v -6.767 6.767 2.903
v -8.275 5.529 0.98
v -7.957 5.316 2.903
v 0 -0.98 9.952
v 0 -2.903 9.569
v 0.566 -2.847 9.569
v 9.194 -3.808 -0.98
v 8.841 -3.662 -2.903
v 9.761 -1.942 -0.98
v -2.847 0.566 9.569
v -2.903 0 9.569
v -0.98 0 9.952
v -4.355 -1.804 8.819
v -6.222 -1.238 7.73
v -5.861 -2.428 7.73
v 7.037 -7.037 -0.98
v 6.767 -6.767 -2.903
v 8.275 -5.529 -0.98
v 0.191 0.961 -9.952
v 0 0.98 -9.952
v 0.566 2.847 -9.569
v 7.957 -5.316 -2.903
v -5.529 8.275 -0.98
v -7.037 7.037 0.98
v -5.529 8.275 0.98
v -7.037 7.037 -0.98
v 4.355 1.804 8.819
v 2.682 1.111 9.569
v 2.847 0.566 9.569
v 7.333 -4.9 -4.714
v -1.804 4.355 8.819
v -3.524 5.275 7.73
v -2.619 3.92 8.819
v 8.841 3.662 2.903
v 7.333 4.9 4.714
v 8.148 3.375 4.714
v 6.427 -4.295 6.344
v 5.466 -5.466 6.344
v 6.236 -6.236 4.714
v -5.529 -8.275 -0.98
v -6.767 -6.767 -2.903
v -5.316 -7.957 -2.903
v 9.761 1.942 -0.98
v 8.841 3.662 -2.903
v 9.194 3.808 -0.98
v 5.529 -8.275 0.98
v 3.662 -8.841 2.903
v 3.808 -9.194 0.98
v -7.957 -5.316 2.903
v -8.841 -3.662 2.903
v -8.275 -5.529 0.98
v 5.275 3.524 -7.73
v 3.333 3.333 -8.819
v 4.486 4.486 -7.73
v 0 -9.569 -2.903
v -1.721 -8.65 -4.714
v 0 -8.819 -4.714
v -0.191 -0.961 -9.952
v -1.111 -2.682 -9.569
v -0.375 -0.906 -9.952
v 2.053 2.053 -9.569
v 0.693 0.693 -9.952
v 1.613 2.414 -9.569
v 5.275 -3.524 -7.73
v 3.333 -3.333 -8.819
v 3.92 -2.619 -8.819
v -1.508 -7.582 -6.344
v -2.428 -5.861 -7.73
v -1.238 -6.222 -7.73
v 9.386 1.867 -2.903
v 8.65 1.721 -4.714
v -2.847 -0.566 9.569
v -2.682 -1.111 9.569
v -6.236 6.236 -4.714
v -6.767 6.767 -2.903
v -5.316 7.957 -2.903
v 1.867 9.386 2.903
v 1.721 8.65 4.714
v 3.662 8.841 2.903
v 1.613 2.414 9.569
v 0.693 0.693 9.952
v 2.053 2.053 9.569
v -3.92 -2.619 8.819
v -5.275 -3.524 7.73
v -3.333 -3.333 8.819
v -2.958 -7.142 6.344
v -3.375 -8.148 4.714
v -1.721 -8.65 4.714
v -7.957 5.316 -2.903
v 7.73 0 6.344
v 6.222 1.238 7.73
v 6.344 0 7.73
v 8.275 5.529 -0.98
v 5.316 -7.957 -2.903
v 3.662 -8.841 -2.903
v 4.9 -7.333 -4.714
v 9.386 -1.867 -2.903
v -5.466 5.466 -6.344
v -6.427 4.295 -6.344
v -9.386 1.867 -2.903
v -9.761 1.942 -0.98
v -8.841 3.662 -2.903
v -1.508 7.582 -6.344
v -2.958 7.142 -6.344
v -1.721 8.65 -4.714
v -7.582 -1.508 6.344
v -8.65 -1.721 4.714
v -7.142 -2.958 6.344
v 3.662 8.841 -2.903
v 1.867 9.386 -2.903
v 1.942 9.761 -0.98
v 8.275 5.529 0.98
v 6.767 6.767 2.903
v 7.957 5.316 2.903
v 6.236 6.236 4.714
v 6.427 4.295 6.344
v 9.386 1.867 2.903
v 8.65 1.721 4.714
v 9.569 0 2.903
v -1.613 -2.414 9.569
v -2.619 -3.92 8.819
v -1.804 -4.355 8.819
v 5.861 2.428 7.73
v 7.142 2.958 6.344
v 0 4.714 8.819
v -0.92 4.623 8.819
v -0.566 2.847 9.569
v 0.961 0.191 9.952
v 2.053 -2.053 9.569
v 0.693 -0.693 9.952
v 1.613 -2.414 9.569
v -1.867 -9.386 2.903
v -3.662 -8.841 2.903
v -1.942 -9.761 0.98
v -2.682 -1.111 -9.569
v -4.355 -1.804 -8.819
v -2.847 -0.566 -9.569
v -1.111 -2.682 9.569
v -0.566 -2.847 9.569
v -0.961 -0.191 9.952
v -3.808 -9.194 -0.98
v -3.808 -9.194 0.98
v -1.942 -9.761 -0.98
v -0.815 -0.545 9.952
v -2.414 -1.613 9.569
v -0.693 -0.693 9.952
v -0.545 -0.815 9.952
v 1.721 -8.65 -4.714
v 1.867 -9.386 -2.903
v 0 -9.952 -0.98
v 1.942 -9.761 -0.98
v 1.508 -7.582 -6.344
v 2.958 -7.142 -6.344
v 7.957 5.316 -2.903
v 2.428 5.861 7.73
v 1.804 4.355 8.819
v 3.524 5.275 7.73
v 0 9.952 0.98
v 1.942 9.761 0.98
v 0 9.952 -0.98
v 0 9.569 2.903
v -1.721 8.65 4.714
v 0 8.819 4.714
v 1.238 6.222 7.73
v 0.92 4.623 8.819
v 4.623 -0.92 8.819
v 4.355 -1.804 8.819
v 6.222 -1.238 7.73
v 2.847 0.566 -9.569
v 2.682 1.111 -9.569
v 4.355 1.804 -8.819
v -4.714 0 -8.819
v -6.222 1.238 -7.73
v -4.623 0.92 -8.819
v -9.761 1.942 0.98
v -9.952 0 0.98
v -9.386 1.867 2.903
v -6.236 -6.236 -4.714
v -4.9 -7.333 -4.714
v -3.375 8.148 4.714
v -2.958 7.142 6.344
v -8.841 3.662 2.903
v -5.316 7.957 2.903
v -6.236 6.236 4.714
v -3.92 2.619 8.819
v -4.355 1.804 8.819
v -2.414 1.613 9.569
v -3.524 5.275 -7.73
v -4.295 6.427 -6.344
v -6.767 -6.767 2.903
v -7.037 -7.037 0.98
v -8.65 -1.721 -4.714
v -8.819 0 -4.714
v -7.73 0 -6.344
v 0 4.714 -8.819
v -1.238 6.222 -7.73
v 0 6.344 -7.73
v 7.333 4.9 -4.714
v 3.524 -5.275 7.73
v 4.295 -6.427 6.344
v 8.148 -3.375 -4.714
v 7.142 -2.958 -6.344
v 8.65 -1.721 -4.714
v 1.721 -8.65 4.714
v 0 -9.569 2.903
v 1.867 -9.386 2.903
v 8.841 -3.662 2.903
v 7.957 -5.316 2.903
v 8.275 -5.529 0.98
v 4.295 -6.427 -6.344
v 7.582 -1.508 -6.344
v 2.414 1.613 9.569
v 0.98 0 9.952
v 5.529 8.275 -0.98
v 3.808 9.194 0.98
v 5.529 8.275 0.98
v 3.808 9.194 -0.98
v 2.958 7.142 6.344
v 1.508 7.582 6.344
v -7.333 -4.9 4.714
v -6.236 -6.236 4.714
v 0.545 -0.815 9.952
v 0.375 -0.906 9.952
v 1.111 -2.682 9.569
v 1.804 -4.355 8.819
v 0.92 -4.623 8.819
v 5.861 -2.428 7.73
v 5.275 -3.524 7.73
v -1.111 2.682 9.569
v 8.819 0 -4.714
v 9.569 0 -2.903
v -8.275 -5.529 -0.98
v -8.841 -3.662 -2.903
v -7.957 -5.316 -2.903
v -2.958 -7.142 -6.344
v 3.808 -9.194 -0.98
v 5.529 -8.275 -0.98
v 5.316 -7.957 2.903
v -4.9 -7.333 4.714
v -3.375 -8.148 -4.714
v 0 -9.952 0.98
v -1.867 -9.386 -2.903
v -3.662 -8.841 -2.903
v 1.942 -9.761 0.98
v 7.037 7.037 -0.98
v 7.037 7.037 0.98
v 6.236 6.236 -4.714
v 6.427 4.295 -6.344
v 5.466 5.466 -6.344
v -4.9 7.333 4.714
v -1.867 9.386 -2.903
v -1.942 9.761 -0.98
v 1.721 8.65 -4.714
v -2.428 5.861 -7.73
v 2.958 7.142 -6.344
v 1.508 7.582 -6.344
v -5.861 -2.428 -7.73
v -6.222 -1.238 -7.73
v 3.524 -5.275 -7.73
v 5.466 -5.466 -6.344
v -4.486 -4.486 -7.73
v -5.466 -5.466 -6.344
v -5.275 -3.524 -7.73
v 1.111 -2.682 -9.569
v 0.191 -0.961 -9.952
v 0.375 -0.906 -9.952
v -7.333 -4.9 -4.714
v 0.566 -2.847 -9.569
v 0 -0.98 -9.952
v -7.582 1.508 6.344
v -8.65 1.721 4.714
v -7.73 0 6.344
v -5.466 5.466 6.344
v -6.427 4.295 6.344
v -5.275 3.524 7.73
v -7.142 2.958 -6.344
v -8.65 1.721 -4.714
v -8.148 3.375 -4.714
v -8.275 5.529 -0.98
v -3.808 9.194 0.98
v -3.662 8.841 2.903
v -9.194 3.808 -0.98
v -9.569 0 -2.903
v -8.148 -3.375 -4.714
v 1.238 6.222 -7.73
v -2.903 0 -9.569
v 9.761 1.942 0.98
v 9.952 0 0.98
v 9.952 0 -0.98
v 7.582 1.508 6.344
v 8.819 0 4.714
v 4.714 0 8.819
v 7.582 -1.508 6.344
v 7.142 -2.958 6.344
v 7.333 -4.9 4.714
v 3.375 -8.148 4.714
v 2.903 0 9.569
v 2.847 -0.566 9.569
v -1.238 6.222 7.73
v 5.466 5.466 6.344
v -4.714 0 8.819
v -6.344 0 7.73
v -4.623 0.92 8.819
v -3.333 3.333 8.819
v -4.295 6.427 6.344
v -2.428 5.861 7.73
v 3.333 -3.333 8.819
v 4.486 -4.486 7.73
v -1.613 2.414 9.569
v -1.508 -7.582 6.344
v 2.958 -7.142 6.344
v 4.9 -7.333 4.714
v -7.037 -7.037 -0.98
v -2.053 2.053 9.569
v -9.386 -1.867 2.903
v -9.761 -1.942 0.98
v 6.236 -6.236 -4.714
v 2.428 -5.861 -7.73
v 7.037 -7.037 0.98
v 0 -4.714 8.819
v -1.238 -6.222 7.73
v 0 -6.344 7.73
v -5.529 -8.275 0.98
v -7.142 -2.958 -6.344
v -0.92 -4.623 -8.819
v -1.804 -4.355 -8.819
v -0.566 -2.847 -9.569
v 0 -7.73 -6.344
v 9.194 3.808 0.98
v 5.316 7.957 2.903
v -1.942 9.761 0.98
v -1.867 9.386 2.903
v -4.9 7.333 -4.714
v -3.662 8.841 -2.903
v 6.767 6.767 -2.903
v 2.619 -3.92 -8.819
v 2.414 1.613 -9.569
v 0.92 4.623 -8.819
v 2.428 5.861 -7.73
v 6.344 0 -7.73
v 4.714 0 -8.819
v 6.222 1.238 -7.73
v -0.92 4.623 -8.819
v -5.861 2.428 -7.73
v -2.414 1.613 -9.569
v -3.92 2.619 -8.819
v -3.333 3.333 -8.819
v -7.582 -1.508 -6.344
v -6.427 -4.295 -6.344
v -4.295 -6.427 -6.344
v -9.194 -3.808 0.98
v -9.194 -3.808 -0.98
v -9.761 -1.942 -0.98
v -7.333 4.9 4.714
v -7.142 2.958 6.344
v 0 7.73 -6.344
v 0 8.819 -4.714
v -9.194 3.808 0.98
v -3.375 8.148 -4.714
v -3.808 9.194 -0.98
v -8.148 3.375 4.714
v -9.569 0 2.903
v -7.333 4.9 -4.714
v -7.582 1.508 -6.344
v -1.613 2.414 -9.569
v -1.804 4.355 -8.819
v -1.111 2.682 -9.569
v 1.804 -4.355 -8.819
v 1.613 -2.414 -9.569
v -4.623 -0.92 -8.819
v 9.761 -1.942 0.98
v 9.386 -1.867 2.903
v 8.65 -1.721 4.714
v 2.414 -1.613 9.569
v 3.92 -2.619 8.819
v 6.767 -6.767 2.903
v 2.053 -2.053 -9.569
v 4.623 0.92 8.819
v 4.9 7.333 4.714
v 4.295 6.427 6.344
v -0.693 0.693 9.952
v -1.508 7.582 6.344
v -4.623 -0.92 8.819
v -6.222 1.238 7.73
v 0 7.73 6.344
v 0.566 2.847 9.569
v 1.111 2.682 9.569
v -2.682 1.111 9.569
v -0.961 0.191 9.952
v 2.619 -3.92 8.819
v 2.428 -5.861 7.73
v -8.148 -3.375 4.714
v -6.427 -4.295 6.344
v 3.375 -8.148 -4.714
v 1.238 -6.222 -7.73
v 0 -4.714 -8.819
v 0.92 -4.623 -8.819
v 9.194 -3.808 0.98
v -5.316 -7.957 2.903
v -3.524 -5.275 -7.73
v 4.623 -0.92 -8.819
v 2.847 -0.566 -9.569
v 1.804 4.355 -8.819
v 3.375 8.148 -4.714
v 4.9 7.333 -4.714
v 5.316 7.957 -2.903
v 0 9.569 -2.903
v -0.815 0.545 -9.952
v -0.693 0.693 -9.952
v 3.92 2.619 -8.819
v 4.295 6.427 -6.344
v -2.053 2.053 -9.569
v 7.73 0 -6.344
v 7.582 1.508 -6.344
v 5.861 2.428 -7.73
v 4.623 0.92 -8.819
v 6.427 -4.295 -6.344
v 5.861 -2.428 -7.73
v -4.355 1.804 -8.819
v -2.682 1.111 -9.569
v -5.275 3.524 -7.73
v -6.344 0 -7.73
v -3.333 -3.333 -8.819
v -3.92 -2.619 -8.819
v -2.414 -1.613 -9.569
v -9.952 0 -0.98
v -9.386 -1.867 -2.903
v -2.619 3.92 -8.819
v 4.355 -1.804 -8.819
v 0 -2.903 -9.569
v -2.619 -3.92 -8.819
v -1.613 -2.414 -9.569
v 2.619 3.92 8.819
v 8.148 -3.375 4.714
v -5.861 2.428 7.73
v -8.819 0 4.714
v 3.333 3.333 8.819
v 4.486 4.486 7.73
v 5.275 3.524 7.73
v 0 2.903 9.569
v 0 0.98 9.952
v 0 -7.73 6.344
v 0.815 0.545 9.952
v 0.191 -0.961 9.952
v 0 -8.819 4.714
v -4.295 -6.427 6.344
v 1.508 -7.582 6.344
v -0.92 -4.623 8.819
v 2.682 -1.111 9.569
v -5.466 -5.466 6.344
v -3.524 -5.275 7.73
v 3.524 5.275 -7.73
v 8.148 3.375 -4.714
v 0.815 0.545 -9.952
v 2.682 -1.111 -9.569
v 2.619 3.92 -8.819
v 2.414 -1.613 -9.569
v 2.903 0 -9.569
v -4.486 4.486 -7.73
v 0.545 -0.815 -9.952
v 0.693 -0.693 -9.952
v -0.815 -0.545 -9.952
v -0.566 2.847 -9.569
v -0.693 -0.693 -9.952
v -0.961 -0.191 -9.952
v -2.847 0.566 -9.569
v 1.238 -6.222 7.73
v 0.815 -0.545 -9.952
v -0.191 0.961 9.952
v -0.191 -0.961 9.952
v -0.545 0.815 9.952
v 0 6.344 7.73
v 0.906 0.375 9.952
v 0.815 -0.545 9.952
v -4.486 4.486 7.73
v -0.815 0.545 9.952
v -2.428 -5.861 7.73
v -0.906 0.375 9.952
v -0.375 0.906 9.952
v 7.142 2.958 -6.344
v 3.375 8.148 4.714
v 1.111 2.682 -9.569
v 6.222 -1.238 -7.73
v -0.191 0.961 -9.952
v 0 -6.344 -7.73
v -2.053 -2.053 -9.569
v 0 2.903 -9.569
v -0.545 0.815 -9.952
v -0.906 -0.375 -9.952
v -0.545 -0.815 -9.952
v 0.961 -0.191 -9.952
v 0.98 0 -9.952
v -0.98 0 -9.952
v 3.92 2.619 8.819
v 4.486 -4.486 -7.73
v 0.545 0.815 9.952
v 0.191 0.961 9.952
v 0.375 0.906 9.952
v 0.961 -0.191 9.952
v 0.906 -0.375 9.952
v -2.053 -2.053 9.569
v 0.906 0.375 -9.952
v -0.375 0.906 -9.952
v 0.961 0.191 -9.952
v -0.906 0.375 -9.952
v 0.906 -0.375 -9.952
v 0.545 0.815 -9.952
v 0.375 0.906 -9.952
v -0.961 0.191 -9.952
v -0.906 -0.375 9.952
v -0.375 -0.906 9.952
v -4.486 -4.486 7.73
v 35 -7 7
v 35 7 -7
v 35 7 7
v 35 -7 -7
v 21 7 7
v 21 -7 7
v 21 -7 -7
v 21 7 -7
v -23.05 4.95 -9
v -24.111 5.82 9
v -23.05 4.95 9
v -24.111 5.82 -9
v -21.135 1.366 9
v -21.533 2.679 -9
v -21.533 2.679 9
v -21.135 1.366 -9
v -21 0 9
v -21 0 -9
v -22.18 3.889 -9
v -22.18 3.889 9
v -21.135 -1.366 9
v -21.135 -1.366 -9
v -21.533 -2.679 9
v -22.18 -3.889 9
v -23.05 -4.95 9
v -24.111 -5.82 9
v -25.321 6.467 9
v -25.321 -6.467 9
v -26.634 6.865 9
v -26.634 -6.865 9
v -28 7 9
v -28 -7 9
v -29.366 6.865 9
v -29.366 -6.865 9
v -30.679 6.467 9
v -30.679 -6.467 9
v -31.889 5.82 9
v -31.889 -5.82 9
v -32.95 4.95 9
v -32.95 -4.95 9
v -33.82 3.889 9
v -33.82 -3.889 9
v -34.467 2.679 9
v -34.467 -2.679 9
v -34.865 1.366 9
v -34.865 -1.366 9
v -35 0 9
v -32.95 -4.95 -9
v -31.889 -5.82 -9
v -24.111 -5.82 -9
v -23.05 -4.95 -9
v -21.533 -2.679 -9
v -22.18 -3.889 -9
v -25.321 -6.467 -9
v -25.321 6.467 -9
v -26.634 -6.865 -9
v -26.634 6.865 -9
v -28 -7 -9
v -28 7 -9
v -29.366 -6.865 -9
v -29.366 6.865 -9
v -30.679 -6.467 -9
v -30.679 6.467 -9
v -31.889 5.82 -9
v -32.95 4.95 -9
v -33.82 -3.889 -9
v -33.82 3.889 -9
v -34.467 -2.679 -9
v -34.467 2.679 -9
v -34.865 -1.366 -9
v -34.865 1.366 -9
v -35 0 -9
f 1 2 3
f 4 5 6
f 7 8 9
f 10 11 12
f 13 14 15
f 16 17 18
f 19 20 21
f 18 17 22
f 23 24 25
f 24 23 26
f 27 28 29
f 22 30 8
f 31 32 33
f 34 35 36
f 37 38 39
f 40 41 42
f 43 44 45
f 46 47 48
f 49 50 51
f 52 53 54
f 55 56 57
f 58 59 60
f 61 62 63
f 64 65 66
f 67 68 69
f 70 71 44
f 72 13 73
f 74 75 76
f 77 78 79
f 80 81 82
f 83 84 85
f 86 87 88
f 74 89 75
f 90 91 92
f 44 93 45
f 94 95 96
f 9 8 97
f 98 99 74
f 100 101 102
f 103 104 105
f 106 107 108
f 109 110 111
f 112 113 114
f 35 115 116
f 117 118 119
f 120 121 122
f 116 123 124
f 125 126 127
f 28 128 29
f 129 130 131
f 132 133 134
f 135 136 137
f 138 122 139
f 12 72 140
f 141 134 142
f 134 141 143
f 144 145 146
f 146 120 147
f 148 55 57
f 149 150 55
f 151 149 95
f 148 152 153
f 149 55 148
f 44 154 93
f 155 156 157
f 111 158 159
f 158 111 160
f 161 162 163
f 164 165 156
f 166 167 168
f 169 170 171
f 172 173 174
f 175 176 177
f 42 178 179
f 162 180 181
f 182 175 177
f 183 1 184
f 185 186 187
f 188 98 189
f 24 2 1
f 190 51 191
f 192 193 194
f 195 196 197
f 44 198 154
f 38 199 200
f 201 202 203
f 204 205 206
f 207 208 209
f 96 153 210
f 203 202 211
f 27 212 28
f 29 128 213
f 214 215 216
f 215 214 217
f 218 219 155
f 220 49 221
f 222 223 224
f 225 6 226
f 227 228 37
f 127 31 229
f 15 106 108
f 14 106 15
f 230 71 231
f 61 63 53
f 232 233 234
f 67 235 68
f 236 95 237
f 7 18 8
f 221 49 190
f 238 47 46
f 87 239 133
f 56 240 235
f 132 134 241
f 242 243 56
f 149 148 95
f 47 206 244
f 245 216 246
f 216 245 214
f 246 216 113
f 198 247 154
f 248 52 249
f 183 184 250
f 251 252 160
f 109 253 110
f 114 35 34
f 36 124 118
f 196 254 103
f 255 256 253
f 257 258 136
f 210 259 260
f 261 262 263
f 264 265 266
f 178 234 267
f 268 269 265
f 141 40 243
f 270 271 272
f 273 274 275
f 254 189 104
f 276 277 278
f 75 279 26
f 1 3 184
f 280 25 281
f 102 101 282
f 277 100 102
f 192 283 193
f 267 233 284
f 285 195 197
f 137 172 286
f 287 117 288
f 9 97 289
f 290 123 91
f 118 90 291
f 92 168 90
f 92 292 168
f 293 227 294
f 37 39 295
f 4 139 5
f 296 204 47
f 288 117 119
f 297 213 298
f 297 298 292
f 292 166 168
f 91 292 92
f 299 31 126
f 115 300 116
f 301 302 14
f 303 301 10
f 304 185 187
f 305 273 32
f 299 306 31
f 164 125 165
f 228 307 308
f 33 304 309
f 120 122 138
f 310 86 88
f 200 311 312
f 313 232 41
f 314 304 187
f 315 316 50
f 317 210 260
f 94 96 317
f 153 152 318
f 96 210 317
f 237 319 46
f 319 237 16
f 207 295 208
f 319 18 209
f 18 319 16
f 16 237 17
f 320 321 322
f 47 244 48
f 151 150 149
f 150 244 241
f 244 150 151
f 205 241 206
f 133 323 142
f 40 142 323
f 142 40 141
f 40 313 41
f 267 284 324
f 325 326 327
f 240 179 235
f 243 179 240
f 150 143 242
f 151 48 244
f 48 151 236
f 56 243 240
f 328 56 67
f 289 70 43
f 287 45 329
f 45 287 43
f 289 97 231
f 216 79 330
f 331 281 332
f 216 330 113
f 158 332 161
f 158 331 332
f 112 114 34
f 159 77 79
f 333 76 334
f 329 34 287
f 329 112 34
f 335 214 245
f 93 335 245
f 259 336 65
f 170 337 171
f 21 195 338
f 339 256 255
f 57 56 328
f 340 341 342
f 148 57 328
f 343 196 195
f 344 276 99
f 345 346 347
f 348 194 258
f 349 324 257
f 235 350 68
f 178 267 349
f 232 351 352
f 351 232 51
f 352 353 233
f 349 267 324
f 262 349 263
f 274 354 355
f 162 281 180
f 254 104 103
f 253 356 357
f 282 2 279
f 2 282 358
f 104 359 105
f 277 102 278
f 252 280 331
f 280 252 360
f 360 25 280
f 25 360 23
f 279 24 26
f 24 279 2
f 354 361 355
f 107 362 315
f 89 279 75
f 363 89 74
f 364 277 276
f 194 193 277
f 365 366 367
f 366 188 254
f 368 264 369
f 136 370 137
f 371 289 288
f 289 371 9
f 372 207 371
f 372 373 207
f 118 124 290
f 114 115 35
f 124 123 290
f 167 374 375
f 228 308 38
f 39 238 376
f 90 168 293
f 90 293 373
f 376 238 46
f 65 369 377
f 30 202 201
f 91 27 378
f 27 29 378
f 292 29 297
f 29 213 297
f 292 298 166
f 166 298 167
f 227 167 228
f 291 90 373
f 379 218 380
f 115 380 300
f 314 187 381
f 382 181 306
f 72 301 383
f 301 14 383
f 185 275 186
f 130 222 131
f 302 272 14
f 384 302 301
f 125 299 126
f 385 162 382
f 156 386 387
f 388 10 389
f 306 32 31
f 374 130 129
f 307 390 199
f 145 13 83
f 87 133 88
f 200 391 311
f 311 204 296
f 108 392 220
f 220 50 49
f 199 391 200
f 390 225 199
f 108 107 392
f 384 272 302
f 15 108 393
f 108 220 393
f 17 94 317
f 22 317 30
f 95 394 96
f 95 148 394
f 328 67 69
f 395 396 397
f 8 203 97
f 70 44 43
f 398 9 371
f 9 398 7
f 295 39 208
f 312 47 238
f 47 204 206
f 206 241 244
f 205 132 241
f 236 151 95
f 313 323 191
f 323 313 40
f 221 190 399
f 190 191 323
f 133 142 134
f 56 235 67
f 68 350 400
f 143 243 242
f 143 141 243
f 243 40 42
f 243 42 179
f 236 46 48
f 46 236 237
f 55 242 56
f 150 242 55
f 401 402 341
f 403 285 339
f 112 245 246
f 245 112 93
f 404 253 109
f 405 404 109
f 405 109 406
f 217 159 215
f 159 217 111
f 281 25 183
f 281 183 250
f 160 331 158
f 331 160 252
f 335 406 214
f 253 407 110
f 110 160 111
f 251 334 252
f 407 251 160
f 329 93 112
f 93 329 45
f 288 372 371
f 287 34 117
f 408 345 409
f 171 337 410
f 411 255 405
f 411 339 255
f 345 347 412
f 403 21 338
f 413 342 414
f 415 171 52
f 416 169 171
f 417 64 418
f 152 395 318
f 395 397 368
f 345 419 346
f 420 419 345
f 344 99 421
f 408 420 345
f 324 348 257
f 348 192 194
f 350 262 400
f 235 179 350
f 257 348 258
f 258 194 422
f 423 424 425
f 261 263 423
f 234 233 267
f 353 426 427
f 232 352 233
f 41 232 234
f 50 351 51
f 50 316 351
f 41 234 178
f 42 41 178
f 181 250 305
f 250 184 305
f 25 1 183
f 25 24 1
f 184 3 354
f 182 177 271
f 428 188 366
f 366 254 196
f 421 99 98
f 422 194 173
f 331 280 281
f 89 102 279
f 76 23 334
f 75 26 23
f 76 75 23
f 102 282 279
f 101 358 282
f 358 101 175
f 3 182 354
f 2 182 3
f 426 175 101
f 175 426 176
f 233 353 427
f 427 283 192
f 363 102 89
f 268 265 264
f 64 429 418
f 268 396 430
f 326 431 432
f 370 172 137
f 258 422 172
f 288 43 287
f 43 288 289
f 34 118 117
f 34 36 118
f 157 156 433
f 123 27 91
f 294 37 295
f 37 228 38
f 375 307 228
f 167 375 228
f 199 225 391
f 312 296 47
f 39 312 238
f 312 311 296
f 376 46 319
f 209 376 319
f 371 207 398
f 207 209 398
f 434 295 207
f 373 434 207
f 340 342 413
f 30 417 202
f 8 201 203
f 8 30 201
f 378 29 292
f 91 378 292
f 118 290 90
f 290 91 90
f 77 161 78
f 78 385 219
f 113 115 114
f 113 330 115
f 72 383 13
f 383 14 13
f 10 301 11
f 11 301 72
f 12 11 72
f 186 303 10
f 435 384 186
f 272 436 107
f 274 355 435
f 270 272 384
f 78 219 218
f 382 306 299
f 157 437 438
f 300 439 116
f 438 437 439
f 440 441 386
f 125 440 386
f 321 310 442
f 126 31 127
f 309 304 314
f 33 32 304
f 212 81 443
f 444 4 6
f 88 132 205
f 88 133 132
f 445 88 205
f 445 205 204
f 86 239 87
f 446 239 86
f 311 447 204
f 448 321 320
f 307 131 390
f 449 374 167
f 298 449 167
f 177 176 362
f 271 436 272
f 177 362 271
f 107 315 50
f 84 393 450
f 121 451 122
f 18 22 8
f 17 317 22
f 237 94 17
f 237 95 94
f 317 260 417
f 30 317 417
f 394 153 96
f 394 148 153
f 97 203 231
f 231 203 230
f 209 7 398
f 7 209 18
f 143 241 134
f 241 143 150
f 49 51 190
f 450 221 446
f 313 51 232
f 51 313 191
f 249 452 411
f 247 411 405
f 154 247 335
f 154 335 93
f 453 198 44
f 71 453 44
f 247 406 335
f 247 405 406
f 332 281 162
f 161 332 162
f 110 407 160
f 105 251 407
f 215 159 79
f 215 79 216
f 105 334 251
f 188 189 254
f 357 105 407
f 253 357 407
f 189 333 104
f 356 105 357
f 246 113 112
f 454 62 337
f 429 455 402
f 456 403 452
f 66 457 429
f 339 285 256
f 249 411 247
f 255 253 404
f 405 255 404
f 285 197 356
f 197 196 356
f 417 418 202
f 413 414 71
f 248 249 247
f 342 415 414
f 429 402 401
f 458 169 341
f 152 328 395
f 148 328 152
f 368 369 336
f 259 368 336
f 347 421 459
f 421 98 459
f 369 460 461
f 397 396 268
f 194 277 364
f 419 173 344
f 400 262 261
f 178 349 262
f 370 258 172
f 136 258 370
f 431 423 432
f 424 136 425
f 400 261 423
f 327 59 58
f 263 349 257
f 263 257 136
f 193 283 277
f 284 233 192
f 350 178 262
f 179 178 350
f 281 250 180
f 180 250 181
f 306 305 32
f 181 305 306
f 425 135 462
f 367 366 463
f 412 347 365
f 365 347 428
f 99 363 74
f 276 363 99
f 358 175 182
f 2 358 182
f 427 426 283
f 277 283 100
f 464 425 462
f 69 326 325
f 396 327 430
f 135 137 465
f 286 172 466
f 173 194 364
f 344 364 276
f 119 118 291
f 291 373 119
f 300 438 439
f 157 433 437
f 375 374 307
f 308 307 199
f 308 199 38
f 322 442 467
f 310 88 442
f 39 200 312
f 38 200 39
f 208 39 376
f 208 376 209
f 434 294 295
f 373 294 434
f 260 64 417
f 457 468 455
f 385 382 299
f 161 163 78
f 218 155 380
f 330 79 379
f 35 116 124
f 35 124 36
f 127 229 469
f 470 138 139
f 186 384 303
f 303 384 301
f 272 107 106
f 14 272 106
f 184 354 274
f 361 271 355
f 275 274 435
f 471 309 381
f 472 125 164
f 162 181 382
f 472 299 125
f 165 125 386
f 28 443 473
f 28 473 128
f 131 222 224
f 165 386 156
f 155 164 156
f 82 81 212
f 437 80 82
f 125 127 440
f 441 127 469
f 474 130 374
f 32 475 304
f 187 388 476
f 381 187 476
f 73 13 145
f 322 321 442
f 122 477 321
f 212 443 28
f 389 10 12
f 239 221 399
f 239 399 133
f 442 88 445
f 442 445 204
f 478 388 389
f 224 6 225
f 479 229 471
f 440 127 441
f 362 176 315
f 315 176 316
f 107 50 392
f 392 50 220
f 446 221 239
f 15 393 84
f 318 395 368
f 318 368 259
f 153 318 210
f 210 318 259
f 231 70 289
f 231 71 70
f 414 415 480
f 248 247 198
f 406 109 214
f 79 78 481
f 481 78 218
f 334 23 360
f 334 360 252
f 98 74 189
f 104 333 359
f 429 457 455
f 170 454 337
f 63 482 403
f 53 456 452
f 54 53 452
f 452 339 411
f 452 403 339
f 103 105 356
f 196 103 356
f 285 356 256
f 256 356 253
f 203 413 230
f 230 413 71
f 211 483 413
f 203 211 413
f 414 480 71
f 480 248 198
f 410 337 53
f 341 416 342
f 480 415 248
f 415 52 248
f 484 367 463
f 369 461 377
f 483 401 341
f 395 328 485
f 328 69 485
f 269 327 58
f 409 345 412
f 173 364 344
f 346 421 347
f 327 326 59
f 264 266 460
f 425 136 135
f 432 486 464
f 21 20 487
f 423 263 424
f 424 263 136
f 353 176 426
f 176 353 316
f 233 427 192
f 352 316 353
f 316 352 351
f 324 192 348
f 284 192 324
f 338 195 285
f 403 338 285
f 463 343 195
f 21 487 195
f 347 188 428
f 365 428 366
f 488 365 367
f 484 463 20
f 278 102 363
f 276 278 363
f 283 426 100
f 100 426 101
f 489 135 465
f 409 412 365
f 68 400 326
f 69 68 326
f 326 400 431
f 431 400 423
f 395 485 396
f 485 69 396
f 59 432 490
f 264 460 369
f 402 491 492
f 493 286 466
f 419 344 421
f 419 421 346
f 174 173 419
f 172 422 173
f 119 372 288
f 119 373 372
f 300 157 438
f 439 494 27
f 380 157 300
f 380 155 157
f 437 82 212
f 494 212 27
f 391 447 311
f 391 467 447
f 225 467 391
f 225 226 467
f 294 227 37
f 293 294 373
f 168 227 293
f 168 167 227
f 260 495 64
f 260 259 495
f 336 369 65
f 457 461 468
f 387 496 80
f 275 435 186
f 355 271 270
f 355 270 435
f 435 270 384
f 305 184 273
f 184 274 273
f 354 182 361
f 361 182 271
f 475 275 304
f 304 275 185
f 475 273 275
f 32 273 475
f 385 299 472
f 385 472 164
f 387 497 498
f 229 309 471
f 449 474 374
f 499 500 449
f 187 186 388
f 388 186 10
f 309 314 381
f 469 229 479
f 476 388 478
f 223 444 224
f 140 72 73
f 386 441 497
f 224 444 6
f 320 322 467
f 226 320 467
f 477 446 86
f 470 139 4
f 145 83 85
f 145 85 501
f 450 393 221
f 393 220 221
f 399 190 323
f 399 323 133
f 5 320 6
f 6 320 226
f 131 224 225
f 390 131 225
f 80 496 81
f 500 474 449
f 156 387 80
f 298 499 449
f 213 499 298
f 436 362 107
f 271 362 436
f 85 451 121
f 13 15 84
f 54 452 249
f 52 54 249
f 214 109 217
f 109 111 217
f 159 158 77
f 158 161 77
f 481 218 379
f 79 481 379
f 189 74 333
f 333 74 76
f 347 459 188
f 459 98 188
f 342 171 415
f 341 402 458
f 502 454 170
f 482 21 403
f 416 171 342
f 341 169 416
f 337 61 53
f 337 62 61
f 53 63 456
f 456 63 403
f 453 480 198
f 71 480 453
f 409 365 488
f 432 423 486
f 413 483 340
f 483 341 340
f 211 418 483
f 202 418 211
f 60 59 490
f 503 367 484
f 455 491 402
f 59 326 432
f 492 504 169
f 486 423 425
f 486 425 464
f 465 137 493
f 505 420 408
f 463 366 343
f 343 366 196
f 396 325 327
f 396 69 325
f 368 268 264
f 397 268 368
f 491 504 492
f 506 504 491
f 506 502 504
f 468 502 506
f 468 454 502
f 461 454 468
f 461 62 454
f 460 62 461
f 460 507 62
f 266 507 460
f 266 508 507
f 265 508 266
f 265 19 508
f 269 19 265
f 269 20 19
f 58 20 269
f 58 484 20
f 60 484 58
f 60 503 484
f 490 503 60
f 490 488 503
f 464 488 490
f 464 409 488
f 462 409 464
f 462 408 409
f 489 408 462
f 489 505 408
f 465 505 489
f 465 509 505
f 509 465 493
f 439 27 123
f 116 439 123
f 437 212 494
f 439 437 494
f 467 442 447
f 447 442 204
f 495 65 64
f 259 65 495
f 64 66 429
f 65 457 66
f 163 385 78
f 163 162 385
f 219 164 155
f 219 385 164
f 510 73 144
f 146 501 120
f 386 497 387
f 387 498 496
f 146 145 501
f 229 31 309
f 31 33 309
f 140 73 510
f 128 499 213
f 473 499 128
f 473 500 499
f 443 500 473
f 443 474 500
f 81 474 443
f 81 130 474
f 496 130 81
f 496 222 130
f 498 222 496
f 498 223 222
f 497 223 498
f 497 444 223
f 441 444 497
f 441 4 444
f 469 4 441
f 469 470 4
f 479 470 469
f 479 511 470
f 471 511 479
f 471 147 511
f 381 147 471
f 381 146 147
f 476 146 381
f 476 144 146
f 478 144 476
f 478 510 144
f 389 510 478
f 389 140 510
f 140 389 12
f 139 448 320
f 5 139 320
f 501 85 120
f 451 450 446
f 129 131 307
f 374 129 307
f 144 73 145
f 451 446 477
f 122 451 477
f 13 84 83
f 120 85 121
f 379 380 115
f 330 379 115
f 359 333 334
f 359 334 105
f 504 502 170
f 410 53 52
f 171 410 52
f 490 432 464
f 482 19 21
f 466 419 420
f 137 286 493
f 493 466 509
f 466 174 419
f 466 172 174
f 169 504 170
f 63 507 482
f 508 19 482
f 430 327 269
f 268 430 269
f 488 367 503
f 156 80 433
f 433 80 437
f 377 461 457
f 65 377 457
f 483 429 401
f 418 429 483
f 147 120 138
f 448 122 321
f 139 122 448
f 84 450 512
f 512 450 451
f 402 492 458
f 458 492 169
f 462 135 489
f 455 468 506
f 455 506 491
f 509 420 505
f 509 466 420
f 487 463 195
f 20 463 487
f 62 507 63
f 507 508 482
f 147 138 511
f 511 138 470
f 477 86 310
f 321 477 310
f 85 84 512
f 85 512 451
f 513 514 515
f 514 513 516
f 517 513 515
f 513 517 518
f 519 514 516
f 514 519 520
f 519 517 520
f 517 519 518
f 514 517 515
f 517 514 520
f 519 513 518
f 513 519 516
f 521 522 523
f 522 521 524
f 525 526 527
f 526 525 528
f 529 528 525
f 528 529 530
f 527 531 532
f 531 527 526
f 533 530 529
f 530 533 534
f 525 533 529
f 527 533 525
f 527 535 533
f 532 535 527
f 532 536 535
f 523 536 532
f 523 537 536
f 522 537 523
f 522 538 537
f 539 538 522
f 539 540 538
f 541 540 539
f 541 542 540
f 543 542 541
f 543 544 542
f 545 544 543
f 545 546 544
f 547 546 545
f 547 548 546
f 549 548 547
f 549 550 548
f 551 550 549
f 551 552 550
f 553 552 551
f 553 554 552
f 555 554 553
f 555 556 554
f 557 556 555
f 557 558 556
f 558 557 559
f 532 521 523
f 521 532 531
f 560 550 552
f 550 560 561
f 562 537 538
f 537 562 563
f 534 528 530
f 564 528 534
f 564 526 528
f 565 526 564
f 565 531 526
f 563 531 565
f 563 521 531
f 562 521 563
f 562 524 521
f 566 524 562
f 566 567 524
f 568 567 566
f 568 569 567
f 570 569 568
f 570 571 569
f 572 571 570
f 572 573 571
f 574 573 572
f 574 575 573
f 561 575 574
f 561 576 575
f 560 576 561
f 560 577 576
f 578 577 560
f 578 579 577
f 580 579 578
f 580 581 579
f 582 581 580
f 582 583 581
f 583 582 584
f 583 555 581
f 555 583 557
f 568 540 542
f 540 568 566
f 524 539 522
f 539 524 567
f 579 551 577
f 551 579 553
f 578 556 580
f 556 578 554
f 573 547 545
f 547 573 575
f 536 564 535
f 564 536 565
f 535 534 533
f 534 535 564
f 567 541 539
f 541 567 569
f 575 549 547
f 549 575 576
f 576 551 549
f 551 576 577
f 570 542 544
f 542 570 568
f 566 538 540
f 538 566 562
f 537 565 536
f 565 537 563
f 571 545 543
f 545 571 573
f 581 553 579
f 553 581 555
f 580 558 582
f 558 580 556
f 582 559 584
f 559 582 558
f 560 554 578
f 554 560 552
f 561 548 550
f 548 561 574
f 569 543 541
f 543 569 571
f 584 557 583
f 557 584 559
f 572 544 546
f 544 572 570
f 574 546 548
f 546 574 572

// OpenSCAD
// BENCH 01 — Trivial baseline
// 3 primitives, no CSG operations.
// Use this to establish the FPS ceiling: the max the renderer can do
// when the traversal cost is negligible.
//
// Expected: highest FPS of all benchmarks.
// Toggle nothing — this is a fixed reference point.

$fn = 32;

color("steelblue")  sphere(r = 10);
color("tomato")     translate([28, 0, 0]) cube(14, center = true);
color("goldenrod")  translate([-28, 0, 0]) cylinder(r = 7, h = 18, center = true);
